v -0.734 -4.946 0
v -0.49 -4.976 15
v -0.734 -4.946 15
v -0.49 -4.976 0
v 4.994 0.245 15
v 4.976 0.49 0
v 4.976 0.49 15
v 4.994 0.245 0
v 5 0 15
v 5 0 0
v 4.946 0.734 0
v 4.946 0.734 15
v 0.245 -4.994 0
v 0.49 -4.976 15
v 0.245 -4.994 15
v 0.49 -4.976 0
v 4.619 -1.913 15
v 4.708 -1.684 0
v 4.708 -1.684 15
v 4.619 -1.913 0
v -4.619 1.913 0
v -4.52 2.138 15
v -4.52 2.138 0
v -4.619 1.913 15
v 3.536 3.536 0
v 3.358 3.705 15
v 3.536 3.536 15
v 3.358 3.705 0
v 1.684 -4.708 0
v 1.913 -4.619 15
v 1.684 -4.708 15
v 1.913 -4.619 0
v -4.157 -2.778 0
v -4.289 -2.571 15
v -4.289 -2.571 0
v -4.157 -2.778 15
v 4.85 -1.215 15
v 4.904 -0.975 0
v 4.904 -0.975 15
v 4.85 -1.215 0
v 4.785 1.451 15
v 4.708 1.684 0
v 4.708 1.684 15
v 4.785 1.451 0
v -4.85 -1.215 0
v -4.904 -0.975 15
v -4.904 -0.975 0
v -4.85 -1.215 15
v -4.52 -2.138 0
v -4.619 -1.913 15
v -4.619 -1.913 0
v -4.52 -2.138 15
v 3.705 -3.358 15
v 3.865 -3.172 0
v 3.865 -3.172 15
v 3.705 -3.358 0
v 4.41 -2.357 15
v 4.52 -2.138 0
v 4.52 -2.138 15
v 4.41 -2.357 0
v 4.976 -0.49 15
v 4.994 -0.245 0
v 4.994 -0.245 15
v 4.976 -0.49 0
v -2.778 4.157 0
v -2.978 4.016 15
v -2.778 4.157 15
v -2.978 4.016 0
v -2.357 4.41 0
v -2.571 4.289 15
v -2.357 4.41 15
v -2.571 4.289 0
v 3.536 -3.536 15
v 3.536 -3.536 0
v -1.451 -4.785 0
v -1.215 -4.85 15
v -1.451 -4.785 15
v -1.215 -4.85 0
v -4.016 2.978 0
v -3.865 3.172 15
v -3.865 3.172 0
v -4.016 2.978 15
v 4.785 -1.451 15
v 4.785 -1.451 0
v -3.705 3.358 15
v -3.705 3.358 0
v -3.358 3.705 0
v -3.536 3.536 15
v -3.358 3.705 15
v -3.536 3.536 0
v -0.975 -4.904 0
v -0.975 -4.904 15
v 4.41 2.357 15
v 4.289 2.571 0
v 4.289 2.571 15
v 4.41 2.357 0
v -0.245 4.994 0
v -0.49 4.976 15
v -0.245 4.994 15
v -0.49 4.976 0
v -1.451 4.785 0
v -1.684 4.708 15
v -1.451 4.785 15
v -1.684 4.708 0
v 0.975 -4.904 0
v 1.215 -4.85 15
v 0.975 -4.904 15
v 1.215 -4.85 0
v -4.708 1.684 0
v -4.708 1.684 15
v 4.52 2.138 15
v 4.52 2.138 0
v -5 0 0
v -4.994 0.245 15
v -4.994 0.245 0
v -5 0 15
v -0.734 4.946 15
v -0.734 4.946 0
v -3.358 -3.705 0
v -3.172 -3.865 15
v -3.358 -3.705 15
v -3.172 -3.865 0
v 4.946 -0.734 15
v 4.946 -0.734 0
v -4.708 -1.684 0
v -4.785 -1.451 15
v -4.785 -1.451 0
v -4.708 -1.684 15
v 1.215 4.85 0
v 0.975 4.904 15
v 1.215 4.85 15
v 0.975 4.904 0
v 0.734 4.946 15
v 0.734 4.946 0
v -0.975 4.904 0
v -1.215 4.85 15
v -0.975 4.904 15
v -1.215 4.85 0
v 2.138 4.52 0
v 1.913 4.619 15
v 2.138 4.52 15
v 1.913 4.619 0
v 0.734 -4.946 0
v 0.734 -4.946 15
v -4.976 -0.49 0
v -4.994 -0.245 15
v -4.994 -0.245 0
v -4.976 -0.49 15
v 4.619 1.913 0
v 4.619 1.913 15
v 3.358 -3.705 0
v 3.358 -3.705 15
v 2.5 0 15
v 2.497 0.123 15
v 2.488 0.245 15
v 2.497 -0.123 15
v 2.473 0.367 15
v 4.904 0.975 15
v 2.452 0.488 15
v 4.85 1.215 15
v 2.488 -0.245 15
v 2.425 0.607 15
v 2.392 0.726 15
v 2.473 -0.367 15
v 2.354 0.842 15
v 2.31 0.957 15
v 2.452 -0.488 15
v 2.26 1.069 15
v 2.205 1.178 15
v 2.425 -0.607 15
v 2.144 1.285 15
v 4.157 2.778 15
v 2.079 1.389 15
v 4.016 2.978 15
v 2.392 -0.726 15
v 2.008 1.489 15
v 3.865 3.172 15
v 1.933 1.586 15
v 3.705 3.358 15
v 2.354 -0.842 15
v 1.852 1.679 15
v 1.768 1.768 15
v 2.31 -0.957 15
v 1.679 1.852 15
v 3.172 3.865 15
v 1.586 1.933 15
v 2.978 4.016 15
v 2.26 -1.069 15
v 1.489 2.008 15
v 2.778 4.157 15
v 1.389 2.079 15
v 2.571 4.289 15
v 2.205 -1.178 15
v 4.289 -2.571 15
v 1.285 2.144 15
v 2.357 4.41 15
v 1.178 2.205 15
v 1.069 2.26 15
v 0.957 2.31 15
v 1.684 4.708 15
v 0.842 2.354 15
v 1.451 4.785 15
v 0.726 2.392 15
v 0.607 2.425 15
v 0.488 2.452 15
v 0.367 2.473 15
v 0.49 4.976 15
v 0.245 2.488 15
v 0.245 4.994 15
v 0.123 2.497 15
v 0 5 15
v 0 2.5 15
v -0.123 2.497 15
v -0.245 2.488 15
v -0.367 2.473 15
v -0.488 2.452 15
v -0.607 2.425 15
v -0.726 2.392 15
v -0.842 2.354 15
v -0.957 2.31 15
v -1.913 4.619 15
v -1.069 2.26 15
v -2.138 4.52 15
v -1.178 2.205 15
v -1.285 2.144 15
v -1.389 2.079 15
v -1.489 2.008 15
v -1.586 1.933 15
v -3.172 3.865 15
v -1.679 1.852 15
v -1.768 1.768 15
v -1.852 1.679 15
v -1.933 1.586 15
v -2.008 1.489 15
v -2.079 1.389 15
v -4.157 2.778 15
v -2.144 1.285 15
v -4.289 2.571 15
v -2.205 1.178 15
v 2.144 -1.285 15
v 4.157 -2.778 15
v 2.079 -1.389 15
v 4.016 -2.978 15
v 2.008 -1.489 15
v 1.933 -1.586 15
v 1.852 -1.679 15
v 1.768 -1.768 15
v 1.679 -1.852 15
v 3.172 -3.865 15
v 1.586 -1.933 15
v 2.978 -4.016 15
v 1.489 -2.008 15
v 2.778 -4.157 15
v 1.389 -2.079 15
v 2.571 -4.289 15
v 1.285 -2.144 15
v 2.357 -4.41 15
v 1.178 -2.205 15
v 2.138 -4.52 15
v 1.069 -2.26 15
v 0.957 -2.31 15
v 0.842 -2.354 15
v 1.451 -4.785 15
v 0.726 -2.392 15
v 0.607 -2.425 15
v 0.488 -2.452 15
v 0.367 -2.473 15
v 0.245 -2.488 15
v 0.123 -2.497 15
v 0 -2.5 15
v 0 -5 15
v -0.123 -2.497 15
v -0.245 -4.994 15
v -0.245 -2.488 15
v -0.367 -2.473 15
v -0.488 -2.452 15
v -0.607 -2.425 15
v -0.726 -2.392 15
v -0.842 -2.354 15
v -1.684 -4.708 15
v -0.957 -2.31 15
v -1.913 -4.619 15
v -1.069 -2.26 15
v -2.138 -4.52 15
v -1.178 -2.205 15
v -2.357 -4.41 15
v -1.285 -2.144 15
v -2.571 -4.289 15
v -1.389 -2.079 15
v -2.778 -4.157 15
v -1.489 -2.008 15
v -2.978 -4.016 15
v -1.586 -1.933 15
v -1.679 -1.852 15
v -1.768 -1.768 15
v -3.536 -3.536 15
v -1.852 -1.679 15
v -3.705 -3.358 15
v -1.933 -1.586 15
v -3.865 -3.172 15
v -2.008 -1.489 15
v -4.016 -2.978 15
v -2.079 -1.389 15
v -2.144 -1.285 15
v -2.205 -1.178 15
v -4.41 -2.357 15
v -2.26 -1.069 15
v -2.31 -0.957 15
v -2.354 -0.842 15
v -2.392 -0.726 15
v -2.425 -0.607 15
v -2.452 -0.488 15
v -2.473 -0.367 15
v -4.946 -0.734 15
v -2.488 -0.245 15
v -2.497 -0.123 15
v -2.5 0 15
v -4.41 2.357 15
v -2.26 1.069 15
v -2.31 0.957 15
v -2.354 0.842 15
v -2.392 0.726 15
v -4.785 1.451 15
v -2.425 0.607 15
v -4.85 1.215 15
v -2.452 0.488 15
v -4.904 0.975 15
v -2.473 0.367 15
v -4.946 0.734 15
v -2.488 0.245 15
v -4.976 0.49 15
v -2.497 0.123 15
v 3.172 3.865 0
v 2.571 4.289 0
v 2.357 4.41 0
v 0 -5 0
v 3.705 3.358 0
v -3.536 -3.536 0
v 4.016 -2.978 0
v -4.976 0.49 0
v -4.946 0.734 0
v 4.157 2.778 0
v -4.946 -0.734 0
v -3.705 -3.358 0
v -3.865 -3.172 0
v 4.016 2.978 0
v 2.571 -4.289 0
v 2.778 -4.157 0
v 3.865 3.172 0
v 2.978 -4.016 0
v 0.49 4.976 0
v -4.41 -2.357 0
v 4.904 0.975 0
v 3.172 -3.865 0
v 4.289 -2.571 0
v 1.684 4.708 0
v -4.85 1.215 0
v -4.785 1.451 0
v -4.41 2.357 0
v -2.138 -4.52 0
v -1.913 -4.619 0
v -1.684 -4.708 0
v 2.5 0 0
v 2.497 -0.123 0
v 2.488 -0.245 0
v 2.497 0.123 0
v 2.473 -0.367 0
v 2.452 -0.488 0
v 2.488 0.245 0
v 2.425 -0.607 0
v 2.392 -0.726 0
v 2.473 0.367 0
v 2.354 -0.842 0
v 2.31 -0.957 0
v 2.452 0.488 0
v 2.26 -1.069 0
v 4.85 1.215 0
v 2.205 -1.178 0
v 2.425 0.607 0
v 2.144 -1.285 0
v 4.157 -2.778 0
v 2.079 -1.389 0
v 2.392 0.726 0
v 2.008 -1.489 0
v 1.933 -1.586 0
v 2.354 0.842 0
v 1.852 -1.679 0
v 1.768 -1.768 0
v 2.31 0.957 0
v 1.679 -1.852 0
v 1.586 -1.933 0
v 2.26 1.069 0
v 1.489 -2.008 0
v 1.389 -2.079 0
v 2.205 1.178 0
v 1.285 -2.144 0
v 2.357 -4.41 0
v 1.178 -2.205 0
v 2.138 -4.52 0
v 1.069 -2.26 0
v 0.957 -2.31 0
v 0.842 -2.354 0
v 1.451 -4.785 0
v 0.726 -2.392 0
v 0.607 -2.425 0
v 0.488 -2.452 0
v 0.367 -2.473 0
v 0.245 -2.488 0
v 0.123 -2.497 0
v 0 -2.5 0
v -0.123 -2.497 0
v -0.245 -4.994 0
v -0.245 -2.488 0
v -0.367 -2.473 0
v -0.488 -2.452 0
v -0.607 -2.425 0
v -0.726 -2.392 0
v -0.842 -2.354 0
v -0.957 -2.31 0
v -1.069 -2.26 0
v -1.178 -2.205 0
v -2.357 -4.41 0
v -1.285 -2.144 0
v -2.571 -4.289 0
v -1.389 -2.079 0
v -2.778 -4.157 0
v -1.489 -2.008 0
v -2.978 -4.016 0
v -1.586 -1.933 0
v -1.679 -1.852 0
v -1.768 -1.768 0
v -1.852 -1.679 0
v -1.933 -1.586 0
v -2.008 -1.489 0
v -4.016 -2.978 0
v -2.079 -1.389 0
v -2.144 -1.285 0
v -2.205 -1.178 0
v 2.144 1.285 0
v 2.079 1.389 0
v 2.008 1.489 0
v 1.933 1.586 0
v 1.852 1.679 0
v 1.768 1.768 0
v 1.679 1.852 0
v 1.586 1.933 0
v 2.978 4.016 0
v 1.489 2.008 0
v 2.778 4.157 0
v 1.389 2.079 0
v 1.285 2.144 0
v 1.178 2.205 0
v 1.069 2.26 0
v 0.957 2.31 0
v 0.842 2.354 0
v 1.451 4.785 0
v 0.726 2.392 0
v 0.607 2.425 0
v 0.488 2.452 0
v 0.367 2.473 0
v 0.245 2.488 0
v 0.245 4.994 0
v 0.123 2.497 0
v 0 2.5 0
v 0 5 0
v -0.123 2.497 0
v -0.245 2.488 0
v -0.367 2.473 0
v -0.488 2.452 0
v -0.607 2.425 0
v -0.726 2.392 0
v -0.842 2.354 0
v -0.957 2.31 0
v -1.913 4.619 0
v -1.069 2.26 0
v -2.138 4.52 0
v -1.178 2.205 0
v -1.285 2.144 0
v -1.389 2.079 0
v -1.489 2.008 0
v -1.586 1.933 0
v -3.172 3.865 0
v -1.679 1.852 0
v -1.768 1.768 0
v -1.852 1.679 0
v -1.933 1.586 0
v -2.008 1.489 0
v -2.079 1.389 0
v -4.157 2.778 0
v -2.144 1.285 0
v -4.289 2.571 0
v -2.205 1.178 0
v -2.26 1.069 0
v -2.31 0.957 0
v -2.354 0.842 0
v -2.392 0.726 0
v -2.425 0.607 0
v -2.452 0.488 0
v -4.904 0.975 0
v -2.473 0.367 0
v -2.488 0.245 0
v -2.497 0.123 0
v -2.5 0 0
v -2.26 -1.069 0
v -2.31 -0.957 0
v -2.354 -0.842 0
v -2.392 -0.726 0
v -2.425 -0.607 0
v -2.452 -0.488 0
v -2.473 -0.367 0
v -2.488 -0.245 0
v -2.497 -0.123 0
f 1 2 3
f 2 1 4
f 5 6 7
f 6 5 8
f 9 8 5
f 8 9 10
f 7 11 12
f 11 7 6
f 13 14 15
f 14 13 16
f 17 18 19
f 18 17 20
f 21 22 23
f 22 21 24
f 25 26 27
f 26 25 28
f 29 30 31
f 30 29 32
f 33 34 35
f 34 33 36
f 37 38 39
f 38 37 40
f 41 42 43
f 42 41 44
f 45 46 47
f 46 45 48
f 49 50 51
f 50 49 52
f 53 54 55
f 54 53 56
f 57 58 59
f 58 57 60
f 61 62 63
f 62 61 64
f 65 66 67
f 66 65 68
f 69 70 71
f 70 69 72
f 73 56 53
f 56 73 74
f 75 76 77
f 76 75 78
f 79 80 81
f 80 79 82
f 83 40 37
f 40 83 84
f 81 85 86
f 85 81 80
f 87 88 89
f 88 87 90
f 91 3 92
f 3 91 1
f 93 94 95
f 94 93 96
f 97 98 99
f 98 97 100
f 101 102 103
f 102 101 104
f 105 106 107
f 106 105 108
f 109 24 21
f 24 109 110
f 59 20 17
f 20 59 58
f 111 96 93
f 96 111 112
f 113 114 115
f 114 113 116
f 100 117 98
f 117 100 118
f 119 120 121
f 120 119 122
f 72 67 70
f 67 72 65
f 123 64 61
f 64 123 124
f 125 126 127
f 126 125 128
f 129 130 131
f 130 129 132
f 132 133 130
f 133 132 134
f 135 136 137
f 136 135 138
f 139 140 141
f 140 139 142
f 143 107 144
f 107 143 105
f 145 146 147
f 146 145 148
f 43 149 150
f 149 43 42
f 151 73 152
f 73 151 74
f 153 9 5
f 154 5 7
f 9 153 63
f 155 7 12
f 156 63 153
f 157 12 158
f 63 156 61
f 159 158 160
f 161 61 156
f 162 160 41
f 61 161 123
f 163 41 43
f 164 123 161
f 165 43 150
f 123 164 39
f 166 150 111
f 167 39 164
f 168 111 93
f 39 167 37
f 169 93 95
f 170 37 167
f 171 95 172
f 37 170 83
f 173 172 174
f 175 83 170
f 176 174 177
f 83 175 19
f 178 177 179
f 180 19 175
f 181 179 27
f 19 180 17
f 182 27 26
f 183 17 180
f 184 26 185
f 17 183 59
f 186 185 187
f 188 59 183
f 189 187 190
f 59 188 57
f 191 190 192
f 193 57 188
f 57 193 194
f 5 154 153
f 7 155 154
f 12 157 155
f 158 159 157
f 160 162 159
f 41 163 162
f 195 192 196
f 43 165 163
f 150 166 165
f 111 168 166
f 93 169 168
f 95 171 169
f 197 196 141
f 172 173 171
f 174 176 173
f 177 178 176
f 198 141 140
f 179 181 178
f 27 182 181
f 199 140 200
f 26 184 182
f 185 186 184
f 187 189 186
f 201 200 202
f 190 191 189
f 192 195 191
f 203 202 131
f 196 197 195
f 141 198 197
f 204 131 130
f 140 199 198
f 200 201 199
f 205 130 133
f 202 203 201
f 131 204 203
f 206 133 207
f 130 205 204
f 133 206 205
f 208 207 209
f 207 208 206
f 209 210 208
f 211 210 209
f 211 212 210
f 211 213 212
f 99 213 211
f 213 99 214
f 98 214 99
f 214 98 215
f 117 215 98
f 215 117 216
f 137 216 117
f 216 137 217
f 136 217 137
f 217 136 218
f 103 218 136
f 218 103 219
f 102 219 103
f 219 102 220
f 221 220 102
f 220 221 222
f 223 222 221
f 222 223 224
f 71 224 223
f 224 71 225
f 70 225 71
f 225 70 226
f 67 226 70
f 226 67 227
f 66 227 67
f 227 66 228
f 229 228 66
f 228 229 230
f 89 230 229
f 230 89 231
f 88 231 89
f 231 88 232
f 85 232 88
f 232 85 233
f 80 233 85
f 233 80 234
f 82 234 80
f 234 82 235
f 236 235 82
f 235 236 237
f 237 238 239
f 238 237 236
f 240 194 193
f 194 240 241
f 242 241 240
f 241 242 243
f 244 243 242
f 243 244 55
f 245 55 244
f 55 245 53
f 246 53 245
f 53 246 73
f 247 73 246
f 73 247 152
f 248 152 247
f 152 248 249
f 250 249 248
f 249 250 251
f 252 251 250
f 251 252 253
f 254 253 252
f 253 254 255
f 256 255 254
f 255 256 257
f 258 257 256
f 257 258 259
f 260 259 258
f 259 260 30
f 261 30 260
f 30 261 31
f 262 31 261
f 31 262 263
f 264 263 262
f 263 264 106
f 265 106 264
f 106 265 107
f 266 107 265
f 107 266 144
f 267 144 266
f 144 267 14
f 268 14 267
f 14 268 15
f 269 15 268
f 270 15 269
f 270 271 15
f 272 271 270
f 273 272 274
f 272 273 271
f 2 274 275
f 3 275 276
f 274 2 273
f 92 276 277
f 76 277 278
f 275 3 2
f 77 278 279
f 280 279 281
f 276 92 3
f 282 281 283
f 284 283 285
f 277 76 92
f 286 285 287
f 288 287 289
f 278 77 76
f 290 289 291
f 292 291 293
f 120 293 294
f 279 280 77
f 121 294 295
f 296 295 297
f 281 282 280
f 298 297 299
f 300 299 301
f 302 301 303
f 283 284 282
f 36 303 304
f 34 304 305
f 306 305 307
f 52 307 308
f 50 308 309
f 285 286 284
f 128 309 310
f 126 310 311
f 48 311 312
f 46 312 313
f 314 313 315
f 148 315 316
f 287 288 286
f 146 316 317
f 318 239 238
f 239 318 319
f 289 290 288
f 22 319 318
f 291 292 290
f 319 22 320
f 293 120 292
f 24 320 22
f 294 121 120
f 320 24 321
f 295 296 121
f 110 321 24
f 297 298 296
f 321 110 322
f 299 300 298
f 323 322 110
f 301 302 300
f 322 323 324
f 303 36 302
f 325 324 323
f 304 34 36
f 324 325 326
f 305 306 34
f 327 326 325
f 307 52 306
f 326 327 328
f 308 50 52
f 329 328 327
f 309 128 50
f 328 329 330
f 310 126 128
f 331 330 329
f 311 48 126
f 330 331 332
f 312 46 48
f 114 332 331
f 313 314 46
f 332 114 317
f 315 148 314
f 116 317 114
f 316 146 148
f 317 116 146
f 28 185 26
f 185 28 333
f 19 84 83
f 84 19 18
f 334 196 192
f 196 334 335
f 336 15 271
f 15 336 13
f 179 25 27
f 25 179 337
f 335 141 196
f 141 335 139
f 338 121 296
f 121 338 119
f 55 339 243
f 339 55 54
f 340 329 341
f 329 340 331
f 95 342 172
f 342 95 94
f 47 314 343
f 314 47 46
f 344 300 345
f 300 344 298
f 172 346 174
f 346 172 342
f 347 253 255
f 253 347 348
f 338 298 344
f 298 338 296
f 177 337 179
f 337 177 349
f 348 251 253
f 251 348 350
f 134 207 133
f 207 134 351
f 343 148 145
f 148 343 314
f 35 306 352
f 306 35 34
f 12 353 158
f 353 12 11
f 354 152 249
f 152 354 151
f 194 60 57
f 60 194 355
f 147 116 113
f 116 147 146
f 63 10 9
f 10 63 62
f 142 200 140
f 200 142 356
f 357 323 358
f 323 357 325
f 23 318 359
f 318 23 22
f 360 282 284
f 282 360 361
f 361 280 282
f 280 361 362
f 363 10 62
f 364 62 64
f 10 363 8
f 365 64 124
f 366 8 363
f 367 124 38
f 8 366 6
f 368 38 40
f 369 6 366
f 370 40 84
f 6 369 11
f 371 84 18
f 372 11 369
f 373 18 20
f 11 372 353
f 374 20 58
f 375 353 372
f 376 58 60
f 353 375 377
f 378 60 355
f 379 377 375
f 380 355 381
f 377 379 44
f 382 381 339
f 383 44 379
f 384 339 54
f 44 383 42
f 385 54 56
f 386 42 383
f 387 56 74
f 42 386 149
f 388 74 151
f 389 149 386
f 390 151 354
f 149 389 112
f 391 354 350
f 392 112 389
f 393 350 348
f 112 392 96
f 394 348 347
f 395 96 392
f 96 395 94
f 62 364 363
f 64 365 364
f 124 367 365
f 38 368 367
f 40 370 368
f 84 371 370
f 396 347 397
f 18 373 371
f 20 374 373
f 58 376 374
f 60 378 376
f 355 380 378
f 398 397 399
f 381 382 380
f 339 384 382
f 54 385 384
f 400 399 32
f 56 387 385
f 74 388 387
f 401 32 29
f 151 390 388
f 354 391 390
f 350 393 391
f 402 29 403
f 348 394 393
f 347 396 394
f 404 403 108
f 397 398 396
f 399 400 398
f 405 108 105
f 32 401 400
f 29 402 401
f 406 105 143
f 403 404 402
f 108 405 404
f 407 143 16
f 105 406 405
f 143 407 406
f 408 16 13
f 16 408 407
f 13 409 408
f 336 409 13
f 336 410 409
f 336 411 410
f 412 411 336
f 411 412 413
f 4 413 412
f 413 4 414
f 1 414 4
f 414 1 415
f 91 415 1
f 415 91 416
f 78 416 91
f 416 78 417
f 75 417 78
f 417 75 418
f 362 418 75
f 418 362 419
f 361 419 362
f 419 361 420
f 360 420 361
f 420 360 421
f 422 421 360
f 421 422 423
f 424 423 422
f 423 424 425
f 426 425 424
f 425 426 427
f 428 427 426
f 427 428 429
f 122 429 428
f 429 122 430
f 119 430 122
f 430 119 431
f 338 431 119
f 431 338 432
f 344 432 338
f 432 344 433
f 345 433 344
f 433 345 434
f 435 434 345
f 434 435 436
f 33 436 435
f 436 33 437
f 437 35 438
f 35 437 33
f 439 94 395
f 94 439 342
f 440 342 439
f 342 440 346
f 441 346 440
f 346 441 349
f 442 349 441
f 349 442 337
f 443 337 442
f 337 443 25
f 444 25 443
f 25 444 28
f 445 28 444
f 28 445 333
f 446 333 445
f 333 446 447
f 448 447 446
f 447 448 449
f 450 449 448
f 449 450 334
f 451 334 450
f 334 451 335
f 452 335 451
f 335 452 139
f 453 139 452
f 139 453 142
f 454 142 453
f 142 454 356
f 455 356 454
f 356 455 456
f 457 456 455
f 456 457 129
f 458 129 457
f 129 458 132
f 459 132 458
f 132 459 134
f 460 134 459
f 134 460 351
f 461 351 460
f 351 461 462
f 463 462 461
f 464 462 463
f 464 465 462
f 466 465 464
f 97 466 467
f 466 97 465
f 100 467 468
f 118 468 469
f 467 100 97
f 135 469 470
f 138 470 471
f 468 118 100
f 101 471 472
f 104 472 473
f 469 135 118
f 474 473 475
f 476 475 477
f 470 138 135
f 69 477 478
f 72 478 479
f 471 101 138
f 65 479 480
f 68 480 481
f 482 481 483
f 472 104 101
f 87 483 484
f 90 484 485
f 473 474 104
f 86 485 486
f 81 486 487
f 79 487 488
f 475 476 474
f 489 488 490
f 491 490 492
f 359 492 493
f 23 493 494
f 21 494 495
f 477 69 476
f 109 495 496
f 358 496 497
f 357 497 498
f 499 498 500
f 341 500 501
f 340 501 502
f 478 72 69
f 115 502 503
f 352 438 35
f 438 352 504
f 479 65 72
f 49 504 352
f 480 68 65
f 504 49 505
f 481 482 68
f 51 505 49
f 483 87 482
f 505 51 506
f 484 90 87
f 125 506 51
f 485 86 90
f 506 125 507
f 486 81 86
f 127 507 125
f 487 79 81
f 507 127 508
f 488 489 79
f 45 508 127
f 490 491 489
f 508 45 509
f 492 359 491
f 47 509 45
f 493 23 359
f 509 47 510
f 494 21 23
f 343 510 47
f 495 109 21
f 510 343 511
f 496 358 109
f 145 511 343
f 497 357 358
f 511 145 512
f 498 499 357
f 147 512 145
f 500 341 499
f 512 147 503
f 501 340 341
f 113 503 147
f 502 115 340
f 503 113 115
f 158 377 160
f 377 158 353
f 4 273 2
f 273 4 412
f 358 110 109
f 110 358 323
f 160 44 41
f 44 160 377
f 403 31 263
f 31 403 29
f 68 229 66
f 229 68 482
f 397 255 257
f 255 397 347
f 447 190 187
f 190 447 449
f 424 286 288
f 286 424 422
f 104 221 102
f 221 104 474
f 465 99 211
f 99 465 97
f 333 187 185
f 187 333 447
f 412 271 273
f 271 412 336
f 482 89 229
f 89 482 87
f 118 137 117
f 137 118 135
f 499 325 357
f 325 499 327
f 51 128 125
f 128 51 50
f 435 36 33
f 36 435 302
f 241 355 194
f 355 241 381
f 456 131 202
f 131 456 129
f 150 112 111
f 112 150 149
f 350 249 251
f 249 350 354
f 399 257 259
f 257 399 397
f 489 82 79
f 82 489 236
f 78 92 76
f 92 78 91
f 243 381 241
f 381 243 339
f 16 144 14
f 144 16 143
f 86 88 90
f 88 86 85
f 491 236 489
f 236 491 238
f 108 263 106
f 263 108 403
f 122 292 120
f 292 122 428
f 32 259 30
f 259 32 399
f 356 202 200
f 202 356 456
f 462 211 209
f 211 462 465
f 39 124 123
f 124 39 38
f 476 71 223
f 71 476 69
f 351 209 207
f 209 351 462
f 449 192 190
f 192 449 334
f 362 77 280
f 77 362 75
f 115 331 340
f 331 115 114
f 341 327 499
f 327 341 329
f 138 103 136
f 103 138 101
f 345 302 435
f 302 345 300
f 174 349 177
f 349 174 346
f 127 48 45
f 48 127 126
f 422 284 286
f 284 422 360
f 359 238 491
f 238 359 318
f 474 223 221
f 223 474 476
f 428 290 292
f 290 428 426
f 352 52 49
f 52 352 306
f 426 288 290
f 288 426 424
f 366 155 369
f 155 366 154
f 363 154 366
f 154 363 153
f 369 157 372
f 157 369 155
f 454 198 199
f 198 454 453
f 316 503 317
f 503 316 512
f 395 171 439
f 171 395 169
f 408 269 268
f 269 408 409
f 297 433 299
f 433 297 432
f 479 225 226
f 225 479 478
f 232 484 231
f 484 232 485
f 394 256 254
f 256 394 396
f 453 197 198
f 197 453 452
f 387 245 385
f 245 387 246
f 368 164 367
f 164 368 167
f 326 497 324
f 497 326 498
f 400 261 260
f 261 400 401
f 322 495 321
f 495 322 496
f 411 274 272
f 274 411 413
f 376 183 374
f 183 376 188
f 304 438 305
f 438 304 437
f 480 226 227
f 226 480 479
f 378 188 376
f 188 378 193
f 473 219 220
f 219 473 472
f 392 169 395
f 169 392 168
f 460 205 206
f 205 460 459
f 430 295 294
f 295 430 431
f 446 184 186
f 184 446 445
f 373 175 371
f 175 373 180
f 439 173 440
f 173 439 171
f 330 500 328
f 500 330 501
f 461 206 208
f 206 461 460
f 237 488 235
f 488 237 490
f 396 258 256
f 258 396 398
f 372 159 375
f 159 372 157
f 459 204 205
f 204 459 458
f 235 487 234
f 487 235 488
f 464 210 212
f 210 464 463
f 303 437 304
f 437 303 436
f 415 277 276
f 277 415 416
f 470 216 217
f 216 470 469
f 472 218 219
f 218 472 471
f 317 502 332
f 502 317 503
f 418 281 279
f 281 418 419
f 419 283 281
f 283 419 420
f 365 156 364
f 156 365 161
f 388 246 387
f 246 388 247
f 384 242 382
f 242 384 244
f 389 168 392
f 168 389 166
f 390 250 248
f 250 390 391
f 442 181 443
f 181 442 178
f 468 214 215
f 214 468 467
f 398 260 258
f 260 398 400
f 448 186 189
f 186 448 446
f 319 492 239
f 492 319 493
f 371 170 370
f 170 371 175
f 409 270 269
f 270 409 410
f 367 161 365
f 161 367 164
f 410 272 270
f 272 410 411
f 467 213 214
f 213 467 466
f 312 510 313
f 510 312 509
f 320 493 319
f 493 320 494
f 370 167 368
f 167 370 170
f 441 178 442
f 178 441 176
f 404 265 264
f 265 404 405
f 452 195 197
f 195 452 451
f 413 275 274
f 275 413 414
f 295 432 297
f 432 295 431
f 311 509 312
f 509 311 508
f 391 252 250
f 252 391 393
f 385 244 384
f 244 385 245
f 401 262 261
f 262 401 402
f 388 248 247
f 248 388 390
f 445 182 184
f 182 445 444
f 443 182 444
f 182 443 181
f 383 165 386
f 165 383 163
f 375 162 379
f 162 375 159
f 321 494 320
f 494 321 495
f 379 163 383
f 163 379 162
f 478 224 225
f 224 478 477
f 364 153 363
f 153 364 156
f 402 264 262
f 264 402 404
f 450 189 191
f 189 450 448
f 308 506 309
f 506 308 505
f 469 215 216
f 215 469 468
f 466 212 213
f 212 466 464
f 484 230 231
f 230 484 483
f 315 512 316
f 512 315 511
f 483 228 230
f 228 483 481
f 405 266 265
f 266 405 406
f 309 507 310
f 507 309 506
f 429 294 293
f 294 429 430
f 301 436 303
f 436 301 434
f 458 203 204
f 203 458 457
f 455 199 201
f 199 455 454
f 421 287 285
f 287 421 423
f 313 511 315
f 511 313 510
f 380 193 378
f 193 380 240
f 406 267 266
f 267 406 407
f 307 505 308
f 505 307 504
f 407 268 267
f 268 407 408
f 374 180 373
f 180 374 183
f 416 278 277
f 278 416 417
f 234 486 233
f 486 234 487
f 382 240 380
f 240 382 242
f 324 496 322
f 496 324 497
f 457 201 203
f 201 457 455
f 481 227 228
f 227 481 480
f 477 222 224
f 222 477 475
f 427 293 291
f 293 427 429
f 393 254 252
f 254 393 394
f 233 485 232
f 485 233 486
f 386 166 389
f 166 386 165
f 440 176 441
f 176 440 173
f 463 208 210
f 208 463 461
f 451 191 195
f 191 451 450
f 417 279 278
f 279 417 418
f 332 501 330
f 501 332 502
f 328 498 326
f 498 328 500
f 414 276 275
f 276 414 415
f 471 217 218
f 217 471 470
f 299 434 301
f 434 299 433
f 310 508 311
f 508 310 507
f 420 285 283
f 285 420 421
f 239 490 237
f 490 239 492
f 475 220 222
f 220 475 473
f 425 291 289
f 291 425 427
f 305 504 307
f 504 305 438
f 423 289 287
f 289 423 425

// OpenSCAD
$fn = 128;

bore_d = 5.0;
outer_d = 10.0;
len = 15.0;

difference() {
  cylinder(d = outer_d, h = len, center = false);
  translate([0, 0, -0.1])
    cylinder(d = bore_d, h = len + 0.2, center = false);
}
